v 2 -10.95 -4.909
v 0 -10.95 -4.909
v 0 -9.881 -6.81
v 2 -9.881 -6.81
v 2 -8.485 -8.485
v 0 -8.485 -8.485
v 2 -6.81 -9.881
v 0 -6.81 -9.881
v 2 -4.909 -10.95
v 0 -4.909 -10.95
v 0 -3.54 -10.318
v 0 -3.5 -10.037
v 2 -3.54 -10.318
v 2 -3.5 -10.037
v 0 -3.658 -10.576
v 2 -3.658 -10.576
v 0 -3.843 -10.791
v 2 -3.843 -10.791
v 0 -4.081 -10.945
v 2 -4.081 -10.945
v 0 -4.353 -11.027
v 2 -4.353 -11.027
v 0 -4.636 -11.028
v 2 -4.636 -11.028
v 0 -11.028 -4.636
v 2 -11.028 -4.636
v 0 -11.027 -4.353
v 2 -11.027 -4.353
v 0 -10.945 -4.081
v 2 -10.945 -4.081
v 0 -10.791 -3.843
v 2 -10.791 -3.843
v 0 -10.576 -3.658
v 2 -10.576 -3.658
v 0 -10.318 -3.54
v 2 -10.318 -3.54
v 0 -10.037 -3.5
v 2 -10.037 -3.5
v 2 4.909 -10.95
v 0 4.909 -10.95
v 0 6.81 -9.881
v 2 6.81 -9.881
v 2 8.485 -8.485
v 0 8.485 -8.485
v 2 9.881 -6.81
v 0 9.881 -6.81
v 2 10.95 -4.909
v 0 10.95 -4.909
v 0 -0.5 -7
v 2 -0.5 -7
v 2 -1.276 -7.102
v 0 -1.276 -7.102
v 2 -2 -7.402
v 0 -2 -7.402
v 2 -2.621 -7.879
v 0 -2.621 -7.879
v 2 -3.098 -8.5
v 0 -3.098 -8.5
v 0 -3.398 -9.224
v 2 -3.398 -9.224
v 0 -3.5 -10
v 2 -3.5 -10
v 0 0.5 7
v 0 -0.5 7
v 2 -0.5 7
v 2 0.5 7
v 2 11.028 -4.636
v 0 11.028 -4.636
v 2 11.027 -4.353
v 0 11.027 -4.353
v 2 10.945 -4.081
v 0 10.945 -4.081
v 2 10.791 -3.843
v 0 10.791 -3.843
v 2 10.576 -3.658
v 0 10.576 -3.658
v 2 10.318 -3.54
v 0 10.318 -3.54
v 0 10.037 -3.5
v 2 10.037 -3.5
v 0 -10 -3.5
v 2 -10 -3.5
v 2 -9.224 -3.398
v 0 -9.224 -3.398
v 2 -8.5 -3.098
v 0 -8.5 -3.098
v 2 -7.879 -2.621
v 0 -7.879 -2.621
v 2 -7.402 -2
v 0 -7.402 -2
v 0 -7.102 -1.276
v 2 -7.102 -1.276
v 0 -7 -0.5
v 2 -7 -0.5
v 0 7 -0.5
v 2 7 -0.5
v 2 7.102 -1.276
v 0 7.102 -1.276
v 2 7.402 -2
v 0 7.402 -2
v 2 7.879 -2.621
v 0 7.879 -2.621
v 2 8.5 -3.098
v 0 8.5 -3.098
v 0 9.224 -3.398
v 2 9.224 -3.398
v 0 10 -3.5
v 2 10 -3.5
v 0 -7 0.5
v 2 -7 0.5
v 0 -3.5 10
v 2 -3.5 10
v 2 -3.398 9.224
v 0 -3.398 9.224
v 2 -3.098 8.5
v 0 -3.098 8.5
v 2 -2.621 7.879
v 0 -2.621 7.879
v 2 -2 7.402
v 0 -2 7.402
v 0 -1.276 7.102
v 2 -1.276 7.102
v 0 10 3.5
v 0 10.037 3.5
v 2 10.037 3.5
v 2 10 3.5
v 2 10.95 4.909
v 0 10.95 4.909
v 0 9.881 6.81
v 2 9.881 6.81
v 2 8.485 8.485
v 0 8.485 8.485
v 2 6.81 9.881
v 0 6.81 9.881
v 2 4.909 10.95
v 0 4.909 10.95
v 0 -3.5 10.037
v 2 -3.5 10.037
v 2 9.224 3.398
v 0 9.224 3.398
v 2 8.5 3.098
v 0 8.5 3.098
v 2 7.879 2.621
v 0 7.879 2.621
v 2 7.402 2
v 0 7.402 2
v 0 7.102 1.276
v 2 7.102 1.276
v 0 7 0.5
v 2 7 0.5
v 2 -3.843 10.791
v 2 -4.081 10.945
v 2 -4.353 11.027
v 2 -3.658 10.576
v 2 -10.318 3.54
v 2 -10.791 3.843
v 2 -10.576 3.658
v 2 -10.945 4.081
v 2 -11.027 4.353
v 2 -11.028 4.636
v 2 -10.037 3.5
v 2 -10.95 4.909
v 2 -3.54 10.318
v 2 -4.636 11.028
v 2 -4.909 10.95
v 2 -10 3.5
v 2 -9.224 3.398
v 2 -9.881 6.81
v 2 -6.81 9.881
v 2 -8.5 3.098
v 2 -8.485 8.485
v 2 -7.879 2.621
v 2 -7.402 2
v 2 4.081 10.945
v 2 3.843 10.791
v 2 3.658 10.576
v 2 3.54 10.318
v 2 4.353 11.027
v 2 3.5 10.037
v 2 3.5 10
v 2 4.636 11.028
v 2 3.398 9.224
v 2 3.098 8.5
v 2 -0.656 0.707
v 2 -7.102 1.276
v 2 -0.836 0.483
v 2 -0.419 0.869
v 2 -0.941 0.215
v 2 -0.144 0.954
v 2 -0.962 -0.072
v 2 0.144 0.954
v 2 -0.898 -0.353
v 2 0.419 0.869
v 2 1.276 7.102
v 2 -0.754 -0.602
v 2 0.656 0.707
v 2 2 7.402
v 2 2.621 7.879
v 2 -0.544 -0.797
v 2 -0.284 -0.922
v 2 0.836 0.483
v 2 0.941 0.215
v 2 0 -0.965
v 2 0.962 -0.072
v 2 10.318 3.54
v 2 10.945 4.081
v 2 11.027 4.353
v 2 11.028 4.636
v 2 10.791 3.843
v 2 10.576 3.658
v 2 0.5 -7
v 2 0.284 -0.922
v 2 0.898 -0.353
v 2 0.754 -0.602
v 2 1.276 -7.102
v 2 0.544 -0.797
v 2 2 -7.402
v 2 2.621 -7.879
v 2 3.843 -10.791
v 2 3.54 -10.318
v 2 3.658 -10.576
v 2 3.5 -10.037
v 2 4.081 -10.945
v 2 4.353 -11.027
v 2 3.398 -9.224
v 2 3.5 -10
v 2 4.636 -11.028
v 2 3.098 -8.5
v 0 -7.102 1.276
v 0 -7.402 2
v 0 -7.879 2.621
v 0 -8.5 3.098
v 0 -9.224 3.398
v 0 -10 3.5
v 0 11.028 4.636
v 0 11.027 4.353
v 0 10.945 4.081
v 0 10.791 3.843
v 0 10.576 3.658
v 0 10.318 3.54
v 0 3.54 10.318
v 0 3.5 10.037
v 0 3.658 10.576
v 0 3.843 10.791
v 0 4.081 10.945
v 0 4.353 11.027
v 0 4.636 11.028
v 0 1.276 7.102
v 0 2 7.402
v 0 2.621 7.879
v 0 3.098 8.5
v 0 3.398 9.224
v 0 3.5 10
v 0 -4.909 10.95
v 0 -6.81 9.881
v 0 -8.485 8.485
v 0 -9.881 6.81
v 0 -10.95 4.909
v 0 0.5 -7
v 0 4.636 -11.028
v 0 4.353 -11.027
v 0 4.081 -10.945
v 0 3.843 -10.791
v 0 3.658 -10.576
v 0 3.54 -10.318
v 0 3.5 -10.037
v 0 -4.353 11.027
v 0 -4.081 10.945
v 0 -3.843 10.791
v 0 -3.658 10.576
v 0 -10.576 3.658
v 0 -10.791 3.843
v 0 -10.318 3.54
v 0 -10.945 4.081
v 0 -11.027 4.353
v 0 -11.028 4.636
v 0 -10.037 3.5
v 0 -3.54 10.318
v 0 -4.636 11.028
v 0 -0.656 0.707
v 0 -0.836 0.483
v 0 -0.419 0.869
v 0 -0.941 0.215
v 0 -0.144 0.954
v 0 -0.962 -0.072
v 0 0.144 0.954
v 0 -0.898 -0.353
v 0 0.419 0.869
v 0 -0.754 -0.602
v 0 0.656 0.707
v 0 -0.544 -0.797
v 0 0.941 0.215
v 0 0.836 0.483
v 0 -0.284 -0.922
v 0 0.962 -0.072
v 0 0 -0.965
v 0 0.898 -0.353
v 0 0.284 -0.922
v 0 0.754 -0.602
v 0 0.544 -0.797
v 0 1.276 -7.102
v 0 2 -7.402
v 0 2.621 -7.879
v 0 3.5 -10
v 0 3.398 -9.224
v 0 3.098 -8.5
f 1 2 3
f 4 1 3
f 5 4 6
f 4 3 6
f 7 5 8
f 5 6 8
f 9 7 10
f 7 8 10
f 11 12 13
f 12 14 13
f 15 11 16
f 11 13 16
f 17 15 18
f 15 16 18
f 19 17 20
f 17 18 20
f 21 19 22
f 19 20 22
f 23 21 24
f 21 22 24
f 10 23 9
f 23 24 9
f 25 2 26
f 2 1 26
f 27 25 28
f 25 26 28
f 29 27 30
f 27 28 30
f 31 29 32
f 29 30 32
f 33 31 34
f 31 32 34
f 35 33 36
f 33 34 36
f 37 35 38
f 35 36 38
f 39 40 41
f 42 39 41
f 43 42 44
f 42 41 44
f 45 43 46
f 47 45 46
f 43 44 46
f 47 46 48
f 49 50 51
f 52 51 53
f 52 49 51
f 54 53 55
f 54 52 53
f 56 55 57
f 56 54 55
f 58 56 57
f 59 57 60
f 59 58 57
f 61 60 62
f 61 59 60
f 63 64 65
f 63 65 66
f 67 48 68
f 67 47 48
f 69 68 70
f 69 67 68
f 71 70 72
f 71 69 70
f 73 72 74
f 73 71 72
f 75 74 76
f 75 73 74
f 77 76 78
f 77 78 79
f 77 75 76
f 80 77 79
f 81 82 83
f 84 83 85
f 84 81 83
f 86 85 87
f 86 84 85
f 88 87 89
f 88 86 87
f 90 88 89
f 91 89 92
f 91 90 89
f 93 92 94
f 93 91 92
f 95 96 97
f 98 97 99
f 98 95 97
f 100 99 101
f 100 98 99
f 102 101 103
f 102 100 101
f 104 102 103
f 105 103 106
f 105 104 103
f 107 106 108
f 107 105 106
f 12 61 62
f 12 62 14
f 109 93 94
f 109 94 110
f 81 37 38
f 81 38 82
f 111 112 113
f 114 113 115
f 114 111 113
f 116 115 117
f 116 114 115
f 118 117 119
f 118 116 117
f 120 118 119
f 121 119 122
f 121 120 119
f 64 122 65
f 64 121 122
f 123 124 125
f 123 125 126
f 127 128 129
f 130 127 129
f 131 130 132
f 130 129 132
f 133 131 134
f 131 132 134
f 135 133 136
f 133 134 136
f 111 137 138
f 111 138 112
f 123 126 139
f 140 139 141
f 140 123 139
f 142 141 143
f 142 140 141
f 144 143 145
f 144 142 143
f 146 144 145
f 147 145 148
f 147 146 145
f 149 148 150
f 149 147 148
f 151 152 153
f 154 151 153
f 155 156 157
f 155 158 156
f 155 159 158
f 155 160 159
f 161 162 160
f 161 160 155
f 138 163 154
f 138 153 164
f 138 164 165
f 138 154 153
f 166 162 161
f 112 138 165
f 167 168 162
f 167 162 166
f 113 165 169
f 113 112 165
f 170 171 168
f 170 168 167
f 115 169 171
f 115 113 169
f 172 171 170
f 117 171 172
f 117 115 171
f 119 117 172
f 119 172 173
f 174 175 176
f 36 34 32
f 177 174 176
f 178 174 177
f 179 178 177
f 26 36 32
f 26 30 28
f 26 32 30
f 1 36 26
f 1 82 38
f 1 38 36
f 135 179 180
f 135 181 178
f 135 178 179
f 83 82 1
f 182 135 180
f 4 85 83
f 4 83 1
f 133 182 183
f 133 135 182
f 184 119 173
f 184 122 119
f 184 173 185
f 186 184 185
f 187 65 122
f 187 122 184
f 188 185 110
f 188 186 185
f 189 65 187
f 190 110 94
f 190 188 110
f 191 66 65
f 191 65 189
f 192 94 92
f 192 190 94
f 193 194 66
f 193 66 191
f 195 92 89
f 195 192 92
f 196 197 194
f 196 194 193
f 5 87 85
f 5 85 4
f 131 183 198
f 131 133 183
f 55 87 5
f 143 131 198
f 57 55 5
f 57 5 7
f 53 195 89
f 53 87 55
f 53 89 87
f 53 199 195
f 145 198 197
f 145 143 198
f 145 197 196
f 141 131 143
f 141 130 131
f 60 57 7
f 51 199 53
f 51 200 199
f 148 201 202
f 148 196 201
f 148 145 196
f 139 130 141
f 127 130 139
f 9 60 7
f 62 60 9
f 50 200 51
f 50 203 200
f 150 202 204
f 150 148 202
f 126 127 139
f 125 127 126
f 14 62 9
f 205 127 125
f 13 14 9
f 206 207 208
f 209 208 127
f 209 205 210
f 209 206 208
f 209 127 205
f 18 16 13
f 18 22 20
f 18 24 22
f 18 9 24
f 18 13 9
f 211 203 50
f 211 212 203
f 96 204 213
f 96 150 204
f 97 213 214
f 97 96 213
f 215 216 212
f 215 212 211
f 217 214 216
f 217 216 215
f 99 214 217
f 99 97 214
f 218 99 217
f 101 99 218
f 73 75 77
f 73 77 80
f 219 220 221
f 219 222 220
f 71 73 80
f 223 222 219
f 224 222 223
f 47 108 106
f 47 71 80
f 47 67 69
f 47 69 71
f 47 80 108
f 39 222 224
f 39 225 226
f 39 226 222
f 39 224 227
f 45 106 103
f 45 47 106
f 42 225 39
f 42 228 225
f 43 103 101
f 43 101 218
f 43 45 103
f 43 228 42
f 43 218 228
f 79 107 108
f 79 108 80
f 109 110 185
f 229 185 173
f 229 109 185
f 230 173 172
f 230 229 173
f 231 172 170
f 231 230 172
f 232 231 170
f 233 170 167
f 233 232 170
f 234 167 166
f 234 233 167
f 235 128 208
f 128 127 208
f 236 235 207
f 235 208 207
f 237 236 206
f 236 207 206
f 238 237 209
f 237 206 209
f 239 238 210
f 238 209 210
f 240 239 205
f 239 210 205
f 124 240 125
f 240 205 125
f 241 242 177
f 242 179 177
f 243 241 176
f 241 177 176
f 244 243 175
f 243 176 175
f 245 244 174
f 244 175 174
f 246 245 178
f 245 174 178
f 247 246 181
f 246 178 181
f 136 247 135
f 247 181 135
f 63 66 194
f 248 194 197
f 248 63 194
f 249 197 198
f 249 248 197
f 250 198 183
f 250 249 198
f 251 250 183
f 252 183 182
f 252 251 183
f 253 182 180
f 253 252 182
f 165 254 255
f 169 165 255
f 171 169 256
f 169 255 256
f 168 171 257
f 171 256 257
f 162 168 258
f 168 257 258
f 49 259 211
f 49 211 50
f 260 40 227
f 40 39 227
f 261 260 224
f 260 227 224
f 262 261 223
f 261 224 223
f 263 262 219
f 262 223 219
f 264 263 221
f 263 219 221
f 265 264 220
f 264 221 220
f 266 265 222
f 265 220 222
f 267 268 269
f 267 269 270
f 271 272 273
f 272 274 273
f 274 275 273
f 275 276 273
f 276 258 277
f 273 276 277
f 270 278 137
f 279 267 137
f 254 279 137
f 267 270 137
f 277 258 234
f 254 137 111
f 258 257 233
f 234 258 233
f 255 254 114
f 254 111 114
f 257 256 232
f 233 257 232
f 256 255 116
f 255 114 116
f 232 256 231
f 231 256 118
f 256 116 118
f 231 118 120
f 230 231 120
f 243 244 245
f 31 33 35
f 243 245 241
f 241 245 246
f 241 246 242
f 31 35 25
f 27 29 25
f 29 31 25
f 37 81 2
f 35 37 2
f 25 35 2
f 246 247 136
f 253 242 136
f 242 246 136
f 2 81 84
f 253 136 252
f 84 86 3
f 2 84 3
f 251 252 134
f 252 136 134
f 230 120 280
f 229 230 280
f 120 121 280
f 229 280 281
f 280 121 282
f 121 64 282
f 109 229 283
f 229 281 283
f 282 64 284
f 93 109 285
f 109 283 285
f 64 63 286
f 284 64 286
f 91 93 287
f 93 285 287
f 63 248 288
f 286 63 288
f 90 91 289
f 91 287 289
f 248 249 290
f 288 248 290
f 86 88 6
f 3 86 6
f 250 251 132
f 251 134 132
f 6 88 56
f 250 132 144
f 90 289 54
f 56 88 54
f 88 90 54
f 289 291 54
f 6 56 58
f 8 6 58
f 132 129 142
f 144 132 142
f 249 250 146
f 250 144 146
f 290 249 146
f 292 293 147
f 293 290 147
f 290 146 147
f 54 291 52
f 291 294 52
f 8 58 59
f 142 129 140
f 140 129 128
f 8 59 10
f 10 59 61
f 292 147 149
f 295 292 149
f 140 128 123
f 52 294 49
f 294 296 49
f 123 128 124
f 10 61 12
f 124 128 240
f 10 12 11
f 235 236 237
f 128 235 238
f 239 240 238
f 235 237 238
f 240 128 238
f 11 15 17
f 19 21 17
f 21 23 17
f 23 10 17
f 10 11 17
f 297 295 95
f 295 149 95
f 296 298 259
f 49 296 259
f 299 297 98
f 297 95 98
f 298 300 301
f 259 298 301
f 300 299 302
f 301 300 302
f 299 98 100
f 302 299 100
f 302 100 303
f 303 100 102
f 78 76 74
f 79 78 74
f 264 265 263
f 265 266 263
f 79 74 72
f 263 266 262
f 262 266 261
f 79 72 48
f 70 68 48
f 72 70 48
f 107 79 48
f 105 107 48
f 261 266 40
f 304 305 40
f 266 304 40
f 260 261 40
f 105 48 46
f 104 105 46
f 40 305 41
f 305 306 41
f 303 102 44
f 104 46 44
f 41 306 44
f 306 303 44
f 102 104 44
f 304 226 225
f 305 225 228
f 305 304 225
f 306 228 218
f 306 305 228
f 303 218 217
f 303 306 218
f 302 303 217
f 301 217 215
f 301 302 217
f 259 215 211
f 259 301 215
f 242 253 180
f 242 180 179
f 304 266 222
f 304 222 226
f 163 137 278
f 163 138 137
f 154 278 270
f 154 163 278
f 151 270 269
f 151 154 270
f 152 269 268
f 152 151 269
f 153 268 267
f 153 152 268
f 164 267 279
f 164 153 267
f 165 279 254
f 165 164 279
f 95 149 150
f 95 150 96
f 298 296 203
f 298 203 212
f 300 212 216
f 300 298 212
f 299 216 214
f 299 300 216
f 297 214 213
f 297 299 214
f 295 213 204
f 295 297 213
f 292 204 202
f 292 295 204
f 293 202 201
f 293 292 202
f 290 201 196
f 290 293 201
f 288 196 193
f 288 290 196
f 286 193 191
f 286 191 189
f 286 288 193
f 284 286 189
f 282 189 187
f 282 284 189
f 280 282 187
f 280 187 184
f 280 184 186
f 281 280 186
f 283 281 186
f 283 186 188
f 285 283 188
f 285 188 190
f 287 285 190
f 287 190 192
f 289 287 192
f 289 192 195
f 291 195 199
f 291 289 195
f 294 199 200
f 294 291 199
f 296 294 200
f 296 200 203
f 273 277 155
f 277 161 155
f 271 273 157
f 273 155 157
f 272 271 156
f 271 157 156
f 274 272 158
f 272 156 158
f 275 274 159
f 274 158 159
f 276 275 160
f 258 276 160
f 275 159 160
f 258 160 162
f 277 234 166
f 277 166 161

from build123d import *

# Parameters (mm, degrees)
SKETCH1_R           = 12
SKETCH1_R_2         = 0.965
BOSS_EXTRUDE1_DEPTH = 2
CUT_EXTRUDE1_DEPTH  = 18.088007491
CIRPATTERN3_COUNT   = 4
FILLET5_R           = 1


with BuildPart() as part:
    # Sketch1 → Boss-Extrude1 (new body)
    with BuildSketch(Plane(origin=(0, 0, 0), x_dir=(0, 0, -1), z_dir=(1, 0, 0))):
        Circle(SKETCH1_R)
        Circle(SKETCH1_R_2, mode=Mode.SUBTRACT)
    extrude(amount=BOSS_EXTRUDE1_DEPTH)

    # Sketch1<3> → Cut-Extrude1 (cut, through all)
    with BuildSketch(Plane(origin=(0, 0, 0), x_dir=(0, 0, -1), z_dir=(1, 0, 0))):
        with BuildLine():
            Line((-3.5, 11.478240283), (-3.5, 10))
            ThreePointArc((-3.5, 10), (-2.621320344, 7.878679656), (-0.5, 7))
            Line((-0.5, 7), (0.5, 7))
            ThreePointArc((0.5, 7), (2.621320344, 7.878679656), (3.5, 10))
            Line((3.5, 10), (3.5, 11.478240283))
            ThreePointArc((3.5, 11.478240283), (0, 12), (-3.5, 11.478240283))
        make_face()
    cut_extrude1 = extrude(amount=CUT_EXTRUDE1_DEPTH, mode=Mode.SUBTRACT)

    # CirPattern3: Cut-Extrude1 ×4 about axis
    cirpattern3_axis = Axis((2, 0, 0), (-1, 0, 0))
    for i in range(1, CIRPATTERN3_COUNT):
        add(cut_extrude1.rotate(cirpattern3_axis, i * 360 / CIRPATTERN3_COUNT), mode=Mode.SUBTRACT)

    # Fillet5
    fillet5_edges = [part.edges().sort_by_distance(p)[0] for p in [
        (1, -11.478240283, -3.5),
        (1, -11.478240283, 3.5),
        (1, -3.5, 11.478240283),
        (1, 3.5, 11.478240283),
        (1, -3.5, -11.478240283),
        (1, 3.5, -11.478240283),
        (1, 11.478240283, -3.5),
        (1, 11.478240283, 3.5),
    ]]
    fillet(fillet5_edges, radius=FILLET5_R)


solid = part.part
